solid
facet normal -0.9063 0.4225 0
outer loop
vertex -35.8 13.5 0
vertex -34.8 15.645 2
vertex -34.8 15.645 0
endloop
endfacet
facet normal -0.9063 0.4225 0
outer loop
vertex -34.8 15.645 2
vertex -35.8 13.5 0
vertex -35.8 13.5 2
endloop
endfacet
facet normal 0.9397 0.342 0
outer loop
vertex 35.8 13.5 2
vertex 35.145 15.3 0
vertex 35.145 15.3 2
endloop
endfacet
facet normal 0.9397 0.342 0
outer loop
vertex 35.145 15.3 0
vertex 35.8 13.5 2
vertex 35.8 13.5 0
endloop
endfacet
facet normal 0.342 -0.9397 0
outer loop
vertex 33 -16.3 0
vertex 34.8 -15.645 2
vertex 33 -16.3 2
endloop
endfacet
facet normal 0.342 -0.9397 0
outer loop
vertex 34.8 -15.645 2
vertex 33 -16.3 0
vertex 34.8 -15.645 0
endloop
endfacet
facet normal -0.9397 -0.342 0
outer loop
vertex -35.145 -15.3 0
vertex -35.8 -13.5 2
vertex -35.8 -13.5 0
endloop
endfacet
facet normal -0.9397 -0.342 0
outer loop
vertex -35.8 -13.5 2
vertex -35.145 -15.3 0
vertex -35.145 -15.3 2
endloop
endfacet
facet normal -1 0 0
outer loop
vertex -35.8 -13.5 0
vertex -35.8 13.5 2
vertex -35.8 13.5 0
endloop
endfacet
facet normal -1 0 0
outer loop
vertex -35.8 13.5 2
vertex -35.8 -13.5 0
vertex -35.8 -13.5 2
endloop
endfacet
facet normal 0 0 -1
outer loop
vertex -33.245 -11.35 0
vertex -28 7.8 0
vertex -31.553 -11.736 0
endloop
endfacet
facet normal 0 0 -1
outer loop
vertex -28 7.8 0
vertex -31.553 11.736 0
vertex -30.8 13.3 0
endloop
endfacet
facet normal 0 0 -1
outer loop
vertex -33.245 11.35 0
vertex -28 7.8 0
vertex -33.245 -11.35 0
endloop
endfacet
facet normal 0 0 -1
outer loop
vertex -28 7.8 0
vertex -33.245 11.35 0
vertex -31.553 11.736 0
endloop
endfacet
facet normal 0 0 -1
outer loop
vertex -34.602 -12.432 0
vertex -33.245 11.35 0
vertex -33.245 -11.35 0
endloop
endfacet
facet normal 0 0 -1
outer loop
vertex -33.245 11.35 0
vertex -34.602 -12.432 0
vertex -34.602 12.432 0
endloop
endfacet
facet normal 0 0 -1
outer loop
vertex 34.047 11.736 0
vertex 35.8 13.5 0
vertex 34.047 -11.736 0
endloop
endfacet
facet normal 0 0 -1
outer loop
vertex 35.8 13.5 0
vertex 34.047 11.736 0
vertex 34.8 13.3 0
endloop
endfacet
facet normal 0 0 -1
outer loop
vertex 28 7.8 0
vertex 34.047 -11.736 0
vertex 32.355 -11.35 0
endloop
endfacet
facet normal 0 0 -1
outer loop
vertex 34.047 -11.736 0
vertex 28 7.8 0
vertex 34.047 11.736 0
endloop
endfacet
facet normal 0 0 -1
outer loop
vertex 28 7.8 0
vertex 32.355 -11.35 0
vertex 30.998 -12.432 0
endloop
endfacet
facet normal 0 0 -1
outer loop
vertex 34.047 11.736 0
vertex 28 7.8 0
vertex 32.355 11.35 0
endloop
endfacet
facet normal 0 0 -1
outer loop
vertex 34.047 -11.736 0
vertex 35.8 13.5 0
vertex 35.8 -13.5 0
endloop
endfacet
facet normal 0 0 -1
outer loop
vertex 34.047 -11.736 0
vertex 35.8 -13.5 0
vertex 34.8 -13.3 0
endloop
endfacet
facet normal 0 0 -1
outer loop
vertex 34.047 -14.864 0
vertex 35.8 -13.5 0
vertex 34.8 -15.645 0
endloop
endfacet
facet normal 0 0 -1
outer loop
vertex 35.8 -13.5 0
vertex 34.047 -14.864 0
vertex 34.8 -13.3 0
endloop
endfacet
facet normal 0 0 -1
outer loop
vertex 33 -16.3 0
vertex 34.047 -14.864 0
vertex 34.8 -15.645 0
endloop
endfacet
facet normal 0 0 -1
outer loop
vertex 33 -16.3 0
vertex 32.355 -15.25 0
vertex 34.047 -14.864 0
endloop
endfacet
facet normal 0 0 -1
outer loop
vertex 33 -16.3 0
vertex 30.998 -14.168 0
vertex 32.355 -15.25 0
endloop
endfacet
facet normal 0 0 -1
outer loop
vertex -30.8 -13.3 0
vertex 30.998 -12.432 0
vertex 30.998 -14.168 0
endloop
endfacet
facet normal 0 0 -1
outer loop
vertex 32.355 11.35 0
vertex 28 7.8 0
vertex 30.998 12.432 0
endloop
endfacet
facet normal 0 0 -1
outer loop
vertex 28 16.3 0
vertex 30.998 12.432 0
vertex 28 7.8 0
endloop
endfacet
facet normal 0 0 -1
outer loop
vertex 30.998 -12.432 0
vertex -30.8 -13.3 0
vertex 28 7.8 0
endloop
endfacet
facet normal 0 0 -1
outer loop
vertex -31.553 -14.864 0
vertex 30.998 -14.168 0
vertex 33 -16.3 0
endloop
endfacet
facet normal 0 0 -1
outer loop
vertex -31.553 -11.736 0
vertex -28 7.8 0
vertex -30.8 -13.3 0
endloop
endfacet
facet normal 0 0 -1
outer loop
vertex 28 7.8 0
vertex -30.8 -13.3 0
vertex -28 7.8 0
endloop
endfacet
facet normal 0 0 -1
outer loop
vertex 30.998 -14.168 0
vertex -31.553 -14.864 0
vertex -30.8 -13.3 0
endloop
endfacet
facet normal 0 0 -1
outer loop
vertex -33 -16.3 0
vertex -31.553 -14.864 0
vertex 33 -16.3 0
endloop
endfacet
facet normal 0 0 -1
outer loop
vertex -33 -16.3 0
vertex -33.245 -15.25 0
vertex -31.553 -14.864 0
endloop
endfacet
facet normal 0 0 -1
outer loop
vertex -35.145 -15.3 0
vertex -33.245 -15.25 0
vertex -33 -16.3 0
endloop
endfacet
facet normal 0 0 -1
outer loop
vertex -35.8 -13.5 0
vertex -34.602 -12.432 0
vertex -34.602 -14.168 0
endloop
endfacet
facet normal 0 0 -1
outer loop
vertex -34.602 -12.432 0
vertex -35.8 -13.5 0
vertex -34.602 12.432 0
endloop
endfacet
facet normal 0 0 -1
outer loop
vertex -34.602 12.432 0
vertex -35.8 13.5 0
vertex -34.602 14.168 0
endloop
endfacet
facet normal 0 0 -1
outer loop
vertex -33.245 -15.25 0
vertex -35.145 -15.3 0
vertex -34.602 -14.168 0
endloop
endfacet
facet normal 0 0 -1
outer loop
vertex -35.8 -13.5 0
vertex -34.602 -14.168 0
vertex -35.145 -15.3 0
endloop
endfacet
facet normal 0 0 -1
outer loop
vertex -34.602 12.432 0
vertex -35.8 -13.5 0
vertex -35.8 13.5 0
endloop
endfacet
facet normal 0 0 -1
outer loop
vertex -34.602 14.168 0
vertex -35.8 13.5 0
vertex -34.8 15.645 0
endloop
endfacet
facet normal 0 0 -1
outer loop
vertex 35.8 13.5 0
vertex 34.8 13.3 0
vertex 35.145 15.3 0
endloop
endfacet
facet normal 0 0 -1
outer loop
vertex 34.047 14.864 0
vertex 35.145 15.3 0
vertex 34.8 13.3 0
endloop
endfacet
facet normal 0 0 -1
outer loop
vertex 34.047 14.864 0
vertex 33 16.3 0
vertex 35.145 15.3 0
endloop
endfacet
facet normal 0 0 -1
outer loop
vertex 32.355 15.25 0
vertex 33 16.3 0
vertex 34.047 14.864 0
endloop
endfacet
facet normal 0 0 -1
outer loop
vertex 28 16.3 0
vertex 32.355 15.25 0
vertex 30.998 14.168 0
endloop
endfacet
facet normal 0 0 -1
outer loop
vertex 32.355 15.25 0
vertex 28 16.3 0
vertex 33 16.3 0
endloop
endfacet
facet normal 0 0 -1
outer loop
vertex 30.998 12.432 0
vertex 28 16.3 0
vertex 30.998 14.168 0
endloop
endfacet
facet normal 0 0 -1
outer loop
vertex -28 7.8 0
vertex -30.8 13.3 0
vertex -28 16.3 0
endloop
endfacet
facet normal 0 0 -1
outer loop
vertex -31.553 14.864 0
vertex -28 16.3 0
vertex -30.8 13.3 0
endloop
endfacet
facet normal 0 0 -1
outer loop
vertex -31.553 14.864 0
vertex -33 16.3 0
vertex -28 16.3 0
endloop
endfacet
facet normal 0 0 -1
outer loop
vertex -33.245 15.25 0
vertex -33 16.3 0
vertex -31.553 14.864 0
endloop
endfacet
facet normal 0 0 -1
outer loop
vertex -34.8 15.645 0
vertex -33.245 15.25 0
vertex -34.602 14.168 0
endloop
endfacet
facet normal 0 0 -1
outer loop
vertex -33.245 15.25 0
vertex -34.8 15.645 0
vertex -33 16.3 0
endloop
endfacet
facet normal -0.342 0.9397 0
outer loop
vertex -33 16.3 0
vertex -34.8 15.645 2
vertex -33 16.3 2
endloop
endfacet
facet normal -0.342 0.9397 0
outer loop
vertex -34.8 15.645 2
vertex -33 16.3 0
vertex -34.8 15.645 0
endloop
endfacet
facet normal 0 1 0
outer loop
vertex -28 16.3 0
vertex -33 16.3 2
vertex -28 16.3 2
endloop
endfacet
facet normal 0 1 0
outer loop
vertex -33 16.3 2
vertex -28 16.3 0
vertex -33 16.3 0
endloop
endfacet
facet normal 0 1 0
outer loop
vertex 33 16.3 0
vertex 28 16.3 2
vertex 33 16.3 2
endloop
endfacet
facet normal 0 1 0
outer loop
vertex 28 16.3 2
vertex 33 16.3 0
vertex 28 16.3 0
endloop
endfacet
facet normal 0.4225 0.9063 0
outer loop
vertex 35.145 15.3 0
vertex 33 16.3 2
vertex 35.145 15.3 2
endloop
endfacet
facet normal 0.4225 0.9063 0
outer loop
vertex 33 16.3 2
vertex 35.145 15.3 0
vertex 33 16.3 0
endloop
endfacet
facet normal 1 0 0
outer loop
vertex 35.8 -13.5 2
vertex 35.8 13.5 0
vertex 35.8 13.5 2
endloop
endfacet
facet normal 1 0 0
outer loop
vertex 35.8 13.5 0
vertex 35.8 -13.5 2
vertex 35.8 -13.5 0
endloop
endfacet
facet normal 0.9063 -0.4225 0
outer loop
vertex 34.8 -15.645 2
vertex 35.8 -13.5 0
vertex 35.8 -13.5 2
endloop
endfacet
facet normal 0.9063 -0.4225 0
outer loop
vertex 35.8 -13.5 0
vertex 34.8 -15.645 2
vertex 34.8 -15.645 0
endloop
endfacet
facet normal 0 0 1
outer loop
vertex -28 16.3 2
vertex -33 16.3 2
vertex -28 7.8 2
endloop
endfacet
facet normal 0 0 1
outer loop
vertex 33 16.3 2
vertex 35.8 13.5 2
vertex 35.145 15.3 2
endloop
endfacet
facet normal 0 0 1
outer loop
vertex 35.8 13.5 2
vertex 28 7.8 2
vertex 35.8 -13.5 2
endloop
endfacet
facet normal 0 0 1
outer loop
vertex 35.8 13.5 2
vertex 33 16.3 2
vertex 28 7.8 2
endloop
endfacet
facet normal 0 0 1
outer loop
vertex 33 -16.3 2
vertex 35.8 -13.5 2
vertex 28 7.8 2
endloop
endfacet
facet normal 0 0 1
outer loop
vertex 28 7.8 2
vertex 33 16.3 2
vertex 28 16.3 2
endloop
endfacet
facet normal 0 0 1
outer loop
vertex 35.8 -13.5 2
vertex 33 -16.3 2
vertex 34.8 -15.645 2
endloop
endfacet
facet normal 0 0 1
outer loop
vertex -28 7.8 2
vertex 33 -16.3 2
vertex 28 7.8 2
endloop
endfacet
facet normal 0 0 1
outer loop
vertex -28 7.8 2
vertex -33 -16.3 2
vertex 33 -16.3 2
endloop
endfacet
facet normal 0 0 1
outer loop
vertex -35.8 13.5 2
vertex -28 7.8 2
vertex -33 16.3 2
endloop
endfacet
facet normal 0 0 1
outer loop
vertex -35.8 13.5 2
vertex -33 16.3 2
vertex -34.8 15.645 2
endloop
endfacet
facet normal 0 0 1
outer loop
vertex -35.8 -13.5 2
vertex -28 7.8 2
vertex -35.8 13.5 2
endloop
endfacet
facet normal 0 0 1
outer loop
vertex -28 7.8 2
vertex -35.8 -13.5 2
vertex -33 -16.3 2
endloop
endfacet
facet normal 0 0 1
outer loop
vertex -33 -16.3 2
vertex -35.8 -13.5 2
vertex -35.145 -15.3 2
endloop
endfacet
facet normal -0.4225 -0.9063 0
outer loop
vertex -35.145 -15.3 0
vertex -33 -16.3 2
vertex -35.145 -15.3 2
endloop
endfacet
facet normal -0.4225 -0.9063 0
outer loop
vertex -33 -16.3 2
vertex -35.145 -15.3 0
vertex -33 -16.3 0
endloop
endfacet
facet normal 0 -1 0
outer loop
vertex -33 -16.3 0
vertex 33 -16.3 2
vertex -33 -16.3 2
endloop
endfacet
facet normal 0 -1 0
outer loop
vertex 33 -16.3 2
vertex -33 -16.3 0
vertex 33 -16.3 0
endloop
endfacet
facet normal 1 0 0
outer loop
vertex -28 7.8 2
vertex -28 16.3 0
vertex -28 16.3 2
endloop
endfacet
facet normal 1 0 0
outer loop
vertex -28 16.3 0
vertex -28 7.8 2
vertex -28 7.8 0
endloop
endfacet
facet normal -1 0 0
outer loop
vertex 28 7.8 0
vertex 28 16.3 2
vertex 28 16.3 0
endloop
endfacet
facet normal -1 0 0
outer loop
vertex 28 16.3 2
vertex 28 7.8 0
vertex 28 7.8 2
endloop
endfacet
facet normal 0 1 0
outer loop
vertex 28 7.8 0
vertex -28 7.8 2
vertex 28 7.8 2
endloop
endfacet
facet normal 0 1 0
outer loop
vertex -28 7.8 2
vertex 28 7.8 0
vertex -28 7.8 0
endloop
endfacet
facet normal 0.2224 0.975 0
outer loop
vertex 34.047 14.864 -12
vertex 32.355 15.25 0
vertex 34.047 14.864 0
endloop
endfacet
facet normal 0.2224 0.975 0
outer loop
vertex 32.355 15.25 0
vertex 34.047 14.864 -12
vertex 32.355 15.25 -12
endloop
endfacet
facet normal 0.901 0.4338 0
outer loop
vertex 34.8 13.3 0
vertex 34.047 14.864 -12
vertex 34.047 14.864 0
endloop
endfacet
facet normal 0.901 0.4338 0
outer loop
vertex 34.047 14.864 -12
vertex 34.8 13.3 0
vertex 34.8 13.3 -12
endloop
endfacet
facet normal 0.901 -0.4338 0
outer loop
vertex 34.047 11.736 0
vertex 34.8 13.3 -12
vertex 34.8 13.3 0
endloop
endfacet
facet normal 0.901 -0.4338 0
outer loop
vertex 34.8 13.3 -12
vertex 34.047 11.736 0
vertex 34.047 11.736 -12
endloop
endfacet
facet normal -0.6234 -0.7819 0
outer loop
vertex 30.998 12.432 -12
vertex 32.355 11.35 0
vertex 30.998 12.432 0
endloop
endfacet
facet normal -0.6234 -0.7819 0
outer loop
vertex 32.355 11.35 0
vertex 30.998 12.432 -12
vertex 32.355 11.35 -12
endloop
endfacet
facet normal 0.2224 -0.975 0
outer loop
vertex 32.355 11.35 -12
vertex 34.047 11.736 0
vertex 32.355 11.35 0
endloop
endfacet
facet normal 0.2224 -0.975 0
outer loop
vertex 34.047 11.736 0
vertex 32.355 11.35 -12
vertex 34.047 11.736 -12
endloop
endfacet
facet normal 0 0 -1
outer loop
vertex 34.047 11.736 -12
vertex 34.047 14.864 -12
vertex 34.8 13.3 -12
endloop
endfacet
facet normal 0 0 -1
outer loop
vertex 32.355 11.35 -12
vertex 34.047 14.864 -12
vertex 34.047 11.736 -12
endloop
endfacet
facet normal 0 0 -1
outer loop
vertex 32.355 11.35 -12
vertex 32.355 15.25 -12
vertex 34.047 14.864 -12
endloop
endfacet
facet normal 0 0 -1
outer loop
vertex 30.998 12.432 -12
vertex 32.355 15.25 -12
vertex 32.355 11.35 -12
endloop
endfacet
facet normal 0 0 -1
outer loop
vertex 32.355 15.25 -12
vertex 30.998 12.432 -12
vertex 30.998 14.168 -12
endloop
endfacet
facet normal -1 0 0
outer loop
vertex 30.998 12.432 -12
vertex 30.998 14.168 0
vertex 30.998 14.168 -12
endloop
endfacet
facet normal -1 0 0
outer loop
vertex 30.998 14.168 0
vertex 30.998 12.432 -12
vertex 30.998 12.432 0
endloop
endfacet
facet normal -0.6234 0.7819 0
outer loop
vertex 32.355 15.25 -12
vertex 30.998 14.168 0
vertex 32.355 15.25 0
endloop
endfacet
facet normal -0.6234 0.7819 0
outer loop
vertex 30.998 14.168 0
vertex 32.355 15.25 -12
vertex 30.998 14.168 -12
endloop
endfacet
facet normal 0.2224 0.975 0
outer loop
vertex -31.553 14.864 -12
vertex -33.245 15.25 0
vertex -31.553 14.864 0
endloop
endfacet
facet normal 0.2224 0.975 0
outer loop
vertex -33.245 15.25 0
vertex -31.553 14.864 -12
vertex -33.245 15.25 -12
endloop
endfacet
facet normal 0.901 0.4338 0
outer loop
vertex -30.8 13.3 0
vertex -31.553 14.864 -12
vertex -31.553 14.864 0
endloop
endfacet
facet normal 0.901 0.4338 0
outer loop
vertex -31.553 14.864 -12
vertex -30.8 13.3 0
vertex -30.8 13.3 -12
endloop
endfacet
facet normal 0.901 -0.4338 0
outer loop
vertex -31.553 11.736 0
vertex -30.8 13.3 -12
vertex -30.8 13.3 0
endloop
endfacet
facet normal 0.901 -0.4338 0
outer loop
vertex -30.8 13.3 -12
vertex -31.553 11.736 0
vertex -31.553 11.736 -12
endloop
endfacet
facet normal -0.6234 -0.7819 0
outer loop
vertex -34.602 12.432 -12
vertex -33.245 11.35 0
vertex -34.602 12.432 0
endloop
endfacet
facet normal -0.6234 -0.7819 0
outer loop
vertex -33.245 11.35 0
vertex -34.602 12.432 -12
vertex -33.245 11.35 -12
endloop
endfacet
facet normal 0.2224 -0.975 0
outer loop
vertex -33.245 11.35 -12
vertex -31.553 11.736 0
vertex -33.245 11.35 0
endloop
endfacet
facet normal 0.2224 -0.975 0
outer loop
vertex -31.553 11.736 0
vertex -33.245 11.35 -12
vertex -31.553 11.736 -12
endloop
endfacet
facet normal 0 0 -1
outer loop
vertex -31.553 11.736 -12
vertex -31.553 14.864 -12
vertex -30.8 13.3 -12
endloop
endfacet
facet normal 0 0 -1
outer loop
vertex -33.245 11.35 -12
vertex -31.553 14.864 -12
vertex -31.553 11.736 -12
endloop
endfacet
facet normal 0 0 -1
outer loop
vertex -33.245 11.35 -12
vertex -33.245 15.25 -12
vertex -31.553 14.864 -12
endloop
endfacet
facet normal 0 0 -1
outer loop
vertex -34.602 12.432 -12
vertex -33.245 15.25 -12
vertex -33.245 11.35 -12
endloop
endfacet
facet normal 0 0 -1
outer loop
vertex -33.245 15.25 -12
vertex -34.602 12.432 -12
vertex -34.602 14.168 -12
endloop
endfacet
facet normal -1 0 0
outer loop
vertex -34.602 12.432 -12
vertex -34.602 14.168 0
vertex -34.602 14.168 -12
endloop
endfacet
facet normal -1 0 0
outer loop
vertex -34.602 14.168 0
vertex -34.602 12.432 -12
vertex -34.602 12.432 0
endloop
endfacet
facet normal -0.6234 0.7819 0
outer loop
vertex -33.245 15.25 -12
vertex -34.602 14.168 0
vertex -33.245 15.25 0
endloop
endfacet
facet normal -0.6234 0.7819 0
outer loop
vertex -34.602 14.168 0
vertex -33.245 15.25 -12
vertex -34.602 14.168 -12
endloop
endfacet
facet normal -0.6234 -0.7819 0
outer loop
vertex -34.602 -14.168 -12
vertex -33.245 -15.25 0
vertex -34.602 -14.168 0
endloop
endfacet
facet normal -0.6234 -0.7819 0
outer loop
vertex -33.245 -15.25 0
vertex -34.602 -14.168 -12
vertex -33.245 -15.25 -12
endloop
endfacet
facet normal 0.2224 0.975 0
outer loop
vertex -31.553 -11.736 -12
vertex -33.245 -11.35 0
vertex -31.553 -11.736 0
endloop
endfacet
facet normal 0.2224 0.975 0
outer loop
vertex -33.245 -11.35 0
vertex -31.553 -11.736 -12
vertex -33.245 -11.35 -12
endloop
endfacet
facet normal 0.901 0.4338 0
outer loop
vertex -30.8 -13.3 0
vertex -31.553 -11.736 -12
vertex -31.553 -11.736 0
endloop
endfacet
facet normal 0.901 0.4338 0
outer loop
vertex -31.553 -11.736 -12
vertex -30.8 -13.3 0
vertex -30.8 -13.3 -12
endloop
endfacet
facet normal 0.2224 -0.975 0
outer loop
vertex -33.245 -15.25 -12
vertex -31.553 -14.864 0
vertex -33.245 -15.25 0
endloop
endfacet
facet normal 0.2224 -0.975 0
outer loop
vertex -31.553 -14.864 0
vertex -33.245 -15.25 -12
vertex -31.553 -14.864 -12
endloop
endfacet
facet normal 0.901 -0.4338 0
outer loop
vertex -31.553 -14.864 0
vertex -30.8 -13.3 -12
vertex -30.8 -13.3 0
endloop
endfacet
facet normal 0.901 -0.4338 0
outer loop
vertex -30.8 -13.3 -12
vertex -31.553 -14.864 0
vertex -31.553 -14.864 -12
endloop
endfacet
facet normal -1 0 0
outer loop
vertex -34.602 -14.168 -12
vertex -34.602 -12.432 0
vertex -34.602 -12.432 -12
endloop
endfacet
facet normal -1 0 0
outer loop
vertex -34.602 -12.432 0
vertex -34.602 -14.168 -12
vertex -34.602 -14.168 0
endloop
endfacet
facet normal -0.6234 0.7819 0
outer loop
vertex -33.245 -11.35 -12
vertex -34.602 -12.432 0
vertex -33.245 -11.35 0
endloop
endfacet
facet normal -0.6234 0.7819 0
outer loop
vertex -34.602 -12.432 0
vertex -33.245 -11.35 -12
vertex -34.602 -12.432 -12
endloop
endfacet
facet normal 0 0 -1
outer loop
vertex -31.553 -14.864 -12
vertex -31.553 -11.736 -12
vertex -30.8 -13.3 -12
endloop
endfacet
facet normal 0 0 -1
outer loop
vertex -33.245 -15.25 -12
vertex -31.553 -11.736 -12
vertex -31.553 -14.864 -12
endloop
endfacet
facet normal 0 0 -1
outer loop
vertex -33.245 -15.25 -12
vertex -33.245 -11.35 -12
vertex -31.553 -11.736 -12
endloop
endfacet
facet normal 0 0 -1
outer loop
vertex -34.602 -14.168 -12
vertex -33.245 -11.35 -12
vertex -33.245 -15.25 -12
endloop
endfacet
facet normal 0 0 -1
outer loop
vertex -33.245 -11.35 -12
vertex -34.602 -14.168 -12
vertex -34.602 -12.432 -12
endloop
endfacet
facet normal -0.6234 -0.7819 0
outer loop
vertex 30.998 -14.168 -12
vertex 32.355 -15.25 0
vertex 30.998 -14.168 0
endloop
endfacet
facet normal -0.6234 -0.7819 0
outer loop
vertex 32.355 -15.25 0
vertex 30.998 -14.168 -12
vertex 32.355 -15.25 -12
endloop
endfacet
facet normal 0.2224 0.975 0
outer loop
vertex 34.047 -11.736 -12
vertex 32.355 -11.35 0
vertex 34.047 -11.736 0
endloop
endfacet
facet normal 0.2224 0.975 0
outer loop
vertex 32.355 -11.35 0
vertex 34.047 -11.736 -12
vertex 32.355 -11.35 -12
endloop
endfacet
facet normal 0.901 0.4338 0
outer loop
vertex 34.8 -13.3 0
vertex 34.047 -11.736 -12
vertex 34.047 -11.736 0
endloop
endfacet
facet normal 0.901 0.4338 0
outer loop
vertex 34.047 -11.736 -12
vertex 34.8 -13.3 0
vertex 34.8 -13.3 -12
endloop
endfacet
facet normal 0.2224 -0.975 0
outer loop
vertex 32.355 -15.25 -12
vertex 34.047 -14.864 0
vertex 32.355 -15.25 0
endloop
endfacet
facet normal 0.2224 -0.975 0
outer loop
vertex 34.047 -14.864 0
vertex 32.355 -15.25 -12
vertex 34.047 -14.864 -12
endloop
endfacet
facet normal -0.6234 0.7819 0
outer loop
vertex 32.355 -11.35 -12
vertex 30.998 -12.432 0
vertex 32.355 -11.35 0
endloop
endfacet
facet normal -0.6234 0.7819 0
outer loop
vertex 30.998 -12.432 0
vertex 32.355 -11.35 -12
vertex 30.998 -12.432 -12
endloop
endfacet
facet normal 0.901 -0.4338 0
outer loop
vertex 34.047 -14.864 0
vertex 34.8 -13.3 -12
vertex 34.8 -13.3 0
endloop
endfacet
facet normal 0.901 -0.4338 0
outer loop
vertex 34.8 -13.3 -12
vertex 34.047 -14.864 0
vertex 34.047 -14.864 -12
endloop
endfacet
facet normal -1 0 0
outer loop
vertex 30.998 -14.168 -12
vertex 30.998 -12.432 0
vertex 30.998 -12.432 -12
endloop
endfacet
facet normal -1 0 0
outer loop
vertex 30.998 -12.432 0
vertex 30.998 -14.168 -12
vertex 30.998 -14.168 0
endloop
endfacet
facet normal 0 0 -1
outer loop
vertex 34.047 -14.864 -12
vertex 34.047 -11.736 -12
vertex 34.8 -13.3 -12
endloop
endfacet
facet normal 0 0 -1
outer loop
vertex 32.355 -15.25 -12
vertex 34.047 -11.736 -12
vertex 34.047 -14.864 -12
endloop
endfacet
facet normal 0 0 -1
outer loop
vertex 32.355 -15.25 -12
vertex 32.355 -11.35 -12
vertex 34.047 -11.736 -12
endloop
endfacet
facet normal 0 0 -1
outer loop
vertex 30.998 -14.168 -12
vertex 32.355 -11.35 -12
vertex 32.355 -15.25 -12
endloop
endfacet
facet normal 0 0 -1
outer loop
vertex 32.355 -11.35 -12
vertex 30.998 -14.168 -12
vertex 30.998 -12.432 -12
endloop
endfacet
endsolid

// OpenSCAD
// Box parameters (should match your existing box parameters)
length = 76;             // Outer length of the box
width = 37;              // Outer width of the box
wall_thickness = 2;      // Thickness of the walls
corner_radius = 5;       // Radius of the outer corners

// Separator parameters
separator_thickness = 2;           // Thickness of the separator
separator_clearance = 0.2;         // Clearance for proper fit

// Pillar parameters
pillar_radius = 2;               // Radius of the pillars
pillar_height = 12;                // Height of the pillars (as per your request)
pillar_margin = 1;                 // Margin from the edges

// Ventilation parameters
vent_line_width = 1;               // Width of the ventilation lines (made thinner)
vent_line_spacing = 3;             // Spacing between lines (center to center)

// Inner dimensions of the box
inner_length = length - 2 * wall_thickness;
inner_width  = width - 2 * wall_thickness;

// Inner corner radius
inner_corner_radius = corner_radius - wall_thickness;

// Separator dimensions
separator_length = inner_length - 2 * separator_clearance;
separator_width  = inner_width - 2 * separator_clearance;
separator_radius = inner_corner_radius - separator_clearance;

// Hole dimensions
hole_length = 56;  // Length of the hole
hole_width = 8;    // Width of the hole

// Create the separator with ventilation lines, pillars, and hole
module separator_with_ventilation_lines_and_pillars() {
    difference() {
        // Separator plate
        translate([0, 0, 0])
            linear_extrude(separator_thickness)
                rounded_rectangle(separator_length, separator_width, separator_radius);

        // Ventilation lines (code for this can be added as needed)

        // Subtract the hole
        translate([0, separator_width/2 - hole_width/2, 0])  // Centered along length, aligned to the edge on width
            linear_extrude(separator_thickness)
                square([hole_length, hole_width + 1], center = true);
    }

    // Pillars
    // Positions for the pillars (stepped back by pillar_margin from the edges)
    positions = [
        [ separator_length / 2 - pillar_margin - pillar_radius,  separator_width / 2 - pillar_margin - pillar_radius],
        [-separator_length / 2 + pillar_margin + pillar_radius,  separator_width / 2 - pillar_margin - pillar_radius],
        [-separator_length / 2 + pillar_margin + pillar_radius, -separator_width / 2 + pillar_margin + pillar_radius],
        [ separator_length / 2 - pillar_margin - pillar_radius, -separator_width / 2 + pillar_margin + pillar_radius]
    ];

    // Create pillars at each corner, connected to the separator
    for (pos = positions) {
        translate([pos[0], pos[1], -pillar_height])
            pillar(pillar_radius, pillar_height + separator_thickness);
    }
}

// Module to create a rounded rectangle
module rounded_rectangle(len, wid, rad) {
    rad = min(rad, len / 2, wid / 2); // Ensure radius does not exceed half the length or width
    offset(r = rad)
        square([len - 2 * rad, wid - 2 * rad], center = true);
}

// Module to create a pillar (cylinder)
module pillar(radius, height) {
    cylinder(h = height, r = radius, center = false);
}

// Render the separator with ventilation lines, pillars, and hole
separator_with_ventilation_lines_and_pillars();
